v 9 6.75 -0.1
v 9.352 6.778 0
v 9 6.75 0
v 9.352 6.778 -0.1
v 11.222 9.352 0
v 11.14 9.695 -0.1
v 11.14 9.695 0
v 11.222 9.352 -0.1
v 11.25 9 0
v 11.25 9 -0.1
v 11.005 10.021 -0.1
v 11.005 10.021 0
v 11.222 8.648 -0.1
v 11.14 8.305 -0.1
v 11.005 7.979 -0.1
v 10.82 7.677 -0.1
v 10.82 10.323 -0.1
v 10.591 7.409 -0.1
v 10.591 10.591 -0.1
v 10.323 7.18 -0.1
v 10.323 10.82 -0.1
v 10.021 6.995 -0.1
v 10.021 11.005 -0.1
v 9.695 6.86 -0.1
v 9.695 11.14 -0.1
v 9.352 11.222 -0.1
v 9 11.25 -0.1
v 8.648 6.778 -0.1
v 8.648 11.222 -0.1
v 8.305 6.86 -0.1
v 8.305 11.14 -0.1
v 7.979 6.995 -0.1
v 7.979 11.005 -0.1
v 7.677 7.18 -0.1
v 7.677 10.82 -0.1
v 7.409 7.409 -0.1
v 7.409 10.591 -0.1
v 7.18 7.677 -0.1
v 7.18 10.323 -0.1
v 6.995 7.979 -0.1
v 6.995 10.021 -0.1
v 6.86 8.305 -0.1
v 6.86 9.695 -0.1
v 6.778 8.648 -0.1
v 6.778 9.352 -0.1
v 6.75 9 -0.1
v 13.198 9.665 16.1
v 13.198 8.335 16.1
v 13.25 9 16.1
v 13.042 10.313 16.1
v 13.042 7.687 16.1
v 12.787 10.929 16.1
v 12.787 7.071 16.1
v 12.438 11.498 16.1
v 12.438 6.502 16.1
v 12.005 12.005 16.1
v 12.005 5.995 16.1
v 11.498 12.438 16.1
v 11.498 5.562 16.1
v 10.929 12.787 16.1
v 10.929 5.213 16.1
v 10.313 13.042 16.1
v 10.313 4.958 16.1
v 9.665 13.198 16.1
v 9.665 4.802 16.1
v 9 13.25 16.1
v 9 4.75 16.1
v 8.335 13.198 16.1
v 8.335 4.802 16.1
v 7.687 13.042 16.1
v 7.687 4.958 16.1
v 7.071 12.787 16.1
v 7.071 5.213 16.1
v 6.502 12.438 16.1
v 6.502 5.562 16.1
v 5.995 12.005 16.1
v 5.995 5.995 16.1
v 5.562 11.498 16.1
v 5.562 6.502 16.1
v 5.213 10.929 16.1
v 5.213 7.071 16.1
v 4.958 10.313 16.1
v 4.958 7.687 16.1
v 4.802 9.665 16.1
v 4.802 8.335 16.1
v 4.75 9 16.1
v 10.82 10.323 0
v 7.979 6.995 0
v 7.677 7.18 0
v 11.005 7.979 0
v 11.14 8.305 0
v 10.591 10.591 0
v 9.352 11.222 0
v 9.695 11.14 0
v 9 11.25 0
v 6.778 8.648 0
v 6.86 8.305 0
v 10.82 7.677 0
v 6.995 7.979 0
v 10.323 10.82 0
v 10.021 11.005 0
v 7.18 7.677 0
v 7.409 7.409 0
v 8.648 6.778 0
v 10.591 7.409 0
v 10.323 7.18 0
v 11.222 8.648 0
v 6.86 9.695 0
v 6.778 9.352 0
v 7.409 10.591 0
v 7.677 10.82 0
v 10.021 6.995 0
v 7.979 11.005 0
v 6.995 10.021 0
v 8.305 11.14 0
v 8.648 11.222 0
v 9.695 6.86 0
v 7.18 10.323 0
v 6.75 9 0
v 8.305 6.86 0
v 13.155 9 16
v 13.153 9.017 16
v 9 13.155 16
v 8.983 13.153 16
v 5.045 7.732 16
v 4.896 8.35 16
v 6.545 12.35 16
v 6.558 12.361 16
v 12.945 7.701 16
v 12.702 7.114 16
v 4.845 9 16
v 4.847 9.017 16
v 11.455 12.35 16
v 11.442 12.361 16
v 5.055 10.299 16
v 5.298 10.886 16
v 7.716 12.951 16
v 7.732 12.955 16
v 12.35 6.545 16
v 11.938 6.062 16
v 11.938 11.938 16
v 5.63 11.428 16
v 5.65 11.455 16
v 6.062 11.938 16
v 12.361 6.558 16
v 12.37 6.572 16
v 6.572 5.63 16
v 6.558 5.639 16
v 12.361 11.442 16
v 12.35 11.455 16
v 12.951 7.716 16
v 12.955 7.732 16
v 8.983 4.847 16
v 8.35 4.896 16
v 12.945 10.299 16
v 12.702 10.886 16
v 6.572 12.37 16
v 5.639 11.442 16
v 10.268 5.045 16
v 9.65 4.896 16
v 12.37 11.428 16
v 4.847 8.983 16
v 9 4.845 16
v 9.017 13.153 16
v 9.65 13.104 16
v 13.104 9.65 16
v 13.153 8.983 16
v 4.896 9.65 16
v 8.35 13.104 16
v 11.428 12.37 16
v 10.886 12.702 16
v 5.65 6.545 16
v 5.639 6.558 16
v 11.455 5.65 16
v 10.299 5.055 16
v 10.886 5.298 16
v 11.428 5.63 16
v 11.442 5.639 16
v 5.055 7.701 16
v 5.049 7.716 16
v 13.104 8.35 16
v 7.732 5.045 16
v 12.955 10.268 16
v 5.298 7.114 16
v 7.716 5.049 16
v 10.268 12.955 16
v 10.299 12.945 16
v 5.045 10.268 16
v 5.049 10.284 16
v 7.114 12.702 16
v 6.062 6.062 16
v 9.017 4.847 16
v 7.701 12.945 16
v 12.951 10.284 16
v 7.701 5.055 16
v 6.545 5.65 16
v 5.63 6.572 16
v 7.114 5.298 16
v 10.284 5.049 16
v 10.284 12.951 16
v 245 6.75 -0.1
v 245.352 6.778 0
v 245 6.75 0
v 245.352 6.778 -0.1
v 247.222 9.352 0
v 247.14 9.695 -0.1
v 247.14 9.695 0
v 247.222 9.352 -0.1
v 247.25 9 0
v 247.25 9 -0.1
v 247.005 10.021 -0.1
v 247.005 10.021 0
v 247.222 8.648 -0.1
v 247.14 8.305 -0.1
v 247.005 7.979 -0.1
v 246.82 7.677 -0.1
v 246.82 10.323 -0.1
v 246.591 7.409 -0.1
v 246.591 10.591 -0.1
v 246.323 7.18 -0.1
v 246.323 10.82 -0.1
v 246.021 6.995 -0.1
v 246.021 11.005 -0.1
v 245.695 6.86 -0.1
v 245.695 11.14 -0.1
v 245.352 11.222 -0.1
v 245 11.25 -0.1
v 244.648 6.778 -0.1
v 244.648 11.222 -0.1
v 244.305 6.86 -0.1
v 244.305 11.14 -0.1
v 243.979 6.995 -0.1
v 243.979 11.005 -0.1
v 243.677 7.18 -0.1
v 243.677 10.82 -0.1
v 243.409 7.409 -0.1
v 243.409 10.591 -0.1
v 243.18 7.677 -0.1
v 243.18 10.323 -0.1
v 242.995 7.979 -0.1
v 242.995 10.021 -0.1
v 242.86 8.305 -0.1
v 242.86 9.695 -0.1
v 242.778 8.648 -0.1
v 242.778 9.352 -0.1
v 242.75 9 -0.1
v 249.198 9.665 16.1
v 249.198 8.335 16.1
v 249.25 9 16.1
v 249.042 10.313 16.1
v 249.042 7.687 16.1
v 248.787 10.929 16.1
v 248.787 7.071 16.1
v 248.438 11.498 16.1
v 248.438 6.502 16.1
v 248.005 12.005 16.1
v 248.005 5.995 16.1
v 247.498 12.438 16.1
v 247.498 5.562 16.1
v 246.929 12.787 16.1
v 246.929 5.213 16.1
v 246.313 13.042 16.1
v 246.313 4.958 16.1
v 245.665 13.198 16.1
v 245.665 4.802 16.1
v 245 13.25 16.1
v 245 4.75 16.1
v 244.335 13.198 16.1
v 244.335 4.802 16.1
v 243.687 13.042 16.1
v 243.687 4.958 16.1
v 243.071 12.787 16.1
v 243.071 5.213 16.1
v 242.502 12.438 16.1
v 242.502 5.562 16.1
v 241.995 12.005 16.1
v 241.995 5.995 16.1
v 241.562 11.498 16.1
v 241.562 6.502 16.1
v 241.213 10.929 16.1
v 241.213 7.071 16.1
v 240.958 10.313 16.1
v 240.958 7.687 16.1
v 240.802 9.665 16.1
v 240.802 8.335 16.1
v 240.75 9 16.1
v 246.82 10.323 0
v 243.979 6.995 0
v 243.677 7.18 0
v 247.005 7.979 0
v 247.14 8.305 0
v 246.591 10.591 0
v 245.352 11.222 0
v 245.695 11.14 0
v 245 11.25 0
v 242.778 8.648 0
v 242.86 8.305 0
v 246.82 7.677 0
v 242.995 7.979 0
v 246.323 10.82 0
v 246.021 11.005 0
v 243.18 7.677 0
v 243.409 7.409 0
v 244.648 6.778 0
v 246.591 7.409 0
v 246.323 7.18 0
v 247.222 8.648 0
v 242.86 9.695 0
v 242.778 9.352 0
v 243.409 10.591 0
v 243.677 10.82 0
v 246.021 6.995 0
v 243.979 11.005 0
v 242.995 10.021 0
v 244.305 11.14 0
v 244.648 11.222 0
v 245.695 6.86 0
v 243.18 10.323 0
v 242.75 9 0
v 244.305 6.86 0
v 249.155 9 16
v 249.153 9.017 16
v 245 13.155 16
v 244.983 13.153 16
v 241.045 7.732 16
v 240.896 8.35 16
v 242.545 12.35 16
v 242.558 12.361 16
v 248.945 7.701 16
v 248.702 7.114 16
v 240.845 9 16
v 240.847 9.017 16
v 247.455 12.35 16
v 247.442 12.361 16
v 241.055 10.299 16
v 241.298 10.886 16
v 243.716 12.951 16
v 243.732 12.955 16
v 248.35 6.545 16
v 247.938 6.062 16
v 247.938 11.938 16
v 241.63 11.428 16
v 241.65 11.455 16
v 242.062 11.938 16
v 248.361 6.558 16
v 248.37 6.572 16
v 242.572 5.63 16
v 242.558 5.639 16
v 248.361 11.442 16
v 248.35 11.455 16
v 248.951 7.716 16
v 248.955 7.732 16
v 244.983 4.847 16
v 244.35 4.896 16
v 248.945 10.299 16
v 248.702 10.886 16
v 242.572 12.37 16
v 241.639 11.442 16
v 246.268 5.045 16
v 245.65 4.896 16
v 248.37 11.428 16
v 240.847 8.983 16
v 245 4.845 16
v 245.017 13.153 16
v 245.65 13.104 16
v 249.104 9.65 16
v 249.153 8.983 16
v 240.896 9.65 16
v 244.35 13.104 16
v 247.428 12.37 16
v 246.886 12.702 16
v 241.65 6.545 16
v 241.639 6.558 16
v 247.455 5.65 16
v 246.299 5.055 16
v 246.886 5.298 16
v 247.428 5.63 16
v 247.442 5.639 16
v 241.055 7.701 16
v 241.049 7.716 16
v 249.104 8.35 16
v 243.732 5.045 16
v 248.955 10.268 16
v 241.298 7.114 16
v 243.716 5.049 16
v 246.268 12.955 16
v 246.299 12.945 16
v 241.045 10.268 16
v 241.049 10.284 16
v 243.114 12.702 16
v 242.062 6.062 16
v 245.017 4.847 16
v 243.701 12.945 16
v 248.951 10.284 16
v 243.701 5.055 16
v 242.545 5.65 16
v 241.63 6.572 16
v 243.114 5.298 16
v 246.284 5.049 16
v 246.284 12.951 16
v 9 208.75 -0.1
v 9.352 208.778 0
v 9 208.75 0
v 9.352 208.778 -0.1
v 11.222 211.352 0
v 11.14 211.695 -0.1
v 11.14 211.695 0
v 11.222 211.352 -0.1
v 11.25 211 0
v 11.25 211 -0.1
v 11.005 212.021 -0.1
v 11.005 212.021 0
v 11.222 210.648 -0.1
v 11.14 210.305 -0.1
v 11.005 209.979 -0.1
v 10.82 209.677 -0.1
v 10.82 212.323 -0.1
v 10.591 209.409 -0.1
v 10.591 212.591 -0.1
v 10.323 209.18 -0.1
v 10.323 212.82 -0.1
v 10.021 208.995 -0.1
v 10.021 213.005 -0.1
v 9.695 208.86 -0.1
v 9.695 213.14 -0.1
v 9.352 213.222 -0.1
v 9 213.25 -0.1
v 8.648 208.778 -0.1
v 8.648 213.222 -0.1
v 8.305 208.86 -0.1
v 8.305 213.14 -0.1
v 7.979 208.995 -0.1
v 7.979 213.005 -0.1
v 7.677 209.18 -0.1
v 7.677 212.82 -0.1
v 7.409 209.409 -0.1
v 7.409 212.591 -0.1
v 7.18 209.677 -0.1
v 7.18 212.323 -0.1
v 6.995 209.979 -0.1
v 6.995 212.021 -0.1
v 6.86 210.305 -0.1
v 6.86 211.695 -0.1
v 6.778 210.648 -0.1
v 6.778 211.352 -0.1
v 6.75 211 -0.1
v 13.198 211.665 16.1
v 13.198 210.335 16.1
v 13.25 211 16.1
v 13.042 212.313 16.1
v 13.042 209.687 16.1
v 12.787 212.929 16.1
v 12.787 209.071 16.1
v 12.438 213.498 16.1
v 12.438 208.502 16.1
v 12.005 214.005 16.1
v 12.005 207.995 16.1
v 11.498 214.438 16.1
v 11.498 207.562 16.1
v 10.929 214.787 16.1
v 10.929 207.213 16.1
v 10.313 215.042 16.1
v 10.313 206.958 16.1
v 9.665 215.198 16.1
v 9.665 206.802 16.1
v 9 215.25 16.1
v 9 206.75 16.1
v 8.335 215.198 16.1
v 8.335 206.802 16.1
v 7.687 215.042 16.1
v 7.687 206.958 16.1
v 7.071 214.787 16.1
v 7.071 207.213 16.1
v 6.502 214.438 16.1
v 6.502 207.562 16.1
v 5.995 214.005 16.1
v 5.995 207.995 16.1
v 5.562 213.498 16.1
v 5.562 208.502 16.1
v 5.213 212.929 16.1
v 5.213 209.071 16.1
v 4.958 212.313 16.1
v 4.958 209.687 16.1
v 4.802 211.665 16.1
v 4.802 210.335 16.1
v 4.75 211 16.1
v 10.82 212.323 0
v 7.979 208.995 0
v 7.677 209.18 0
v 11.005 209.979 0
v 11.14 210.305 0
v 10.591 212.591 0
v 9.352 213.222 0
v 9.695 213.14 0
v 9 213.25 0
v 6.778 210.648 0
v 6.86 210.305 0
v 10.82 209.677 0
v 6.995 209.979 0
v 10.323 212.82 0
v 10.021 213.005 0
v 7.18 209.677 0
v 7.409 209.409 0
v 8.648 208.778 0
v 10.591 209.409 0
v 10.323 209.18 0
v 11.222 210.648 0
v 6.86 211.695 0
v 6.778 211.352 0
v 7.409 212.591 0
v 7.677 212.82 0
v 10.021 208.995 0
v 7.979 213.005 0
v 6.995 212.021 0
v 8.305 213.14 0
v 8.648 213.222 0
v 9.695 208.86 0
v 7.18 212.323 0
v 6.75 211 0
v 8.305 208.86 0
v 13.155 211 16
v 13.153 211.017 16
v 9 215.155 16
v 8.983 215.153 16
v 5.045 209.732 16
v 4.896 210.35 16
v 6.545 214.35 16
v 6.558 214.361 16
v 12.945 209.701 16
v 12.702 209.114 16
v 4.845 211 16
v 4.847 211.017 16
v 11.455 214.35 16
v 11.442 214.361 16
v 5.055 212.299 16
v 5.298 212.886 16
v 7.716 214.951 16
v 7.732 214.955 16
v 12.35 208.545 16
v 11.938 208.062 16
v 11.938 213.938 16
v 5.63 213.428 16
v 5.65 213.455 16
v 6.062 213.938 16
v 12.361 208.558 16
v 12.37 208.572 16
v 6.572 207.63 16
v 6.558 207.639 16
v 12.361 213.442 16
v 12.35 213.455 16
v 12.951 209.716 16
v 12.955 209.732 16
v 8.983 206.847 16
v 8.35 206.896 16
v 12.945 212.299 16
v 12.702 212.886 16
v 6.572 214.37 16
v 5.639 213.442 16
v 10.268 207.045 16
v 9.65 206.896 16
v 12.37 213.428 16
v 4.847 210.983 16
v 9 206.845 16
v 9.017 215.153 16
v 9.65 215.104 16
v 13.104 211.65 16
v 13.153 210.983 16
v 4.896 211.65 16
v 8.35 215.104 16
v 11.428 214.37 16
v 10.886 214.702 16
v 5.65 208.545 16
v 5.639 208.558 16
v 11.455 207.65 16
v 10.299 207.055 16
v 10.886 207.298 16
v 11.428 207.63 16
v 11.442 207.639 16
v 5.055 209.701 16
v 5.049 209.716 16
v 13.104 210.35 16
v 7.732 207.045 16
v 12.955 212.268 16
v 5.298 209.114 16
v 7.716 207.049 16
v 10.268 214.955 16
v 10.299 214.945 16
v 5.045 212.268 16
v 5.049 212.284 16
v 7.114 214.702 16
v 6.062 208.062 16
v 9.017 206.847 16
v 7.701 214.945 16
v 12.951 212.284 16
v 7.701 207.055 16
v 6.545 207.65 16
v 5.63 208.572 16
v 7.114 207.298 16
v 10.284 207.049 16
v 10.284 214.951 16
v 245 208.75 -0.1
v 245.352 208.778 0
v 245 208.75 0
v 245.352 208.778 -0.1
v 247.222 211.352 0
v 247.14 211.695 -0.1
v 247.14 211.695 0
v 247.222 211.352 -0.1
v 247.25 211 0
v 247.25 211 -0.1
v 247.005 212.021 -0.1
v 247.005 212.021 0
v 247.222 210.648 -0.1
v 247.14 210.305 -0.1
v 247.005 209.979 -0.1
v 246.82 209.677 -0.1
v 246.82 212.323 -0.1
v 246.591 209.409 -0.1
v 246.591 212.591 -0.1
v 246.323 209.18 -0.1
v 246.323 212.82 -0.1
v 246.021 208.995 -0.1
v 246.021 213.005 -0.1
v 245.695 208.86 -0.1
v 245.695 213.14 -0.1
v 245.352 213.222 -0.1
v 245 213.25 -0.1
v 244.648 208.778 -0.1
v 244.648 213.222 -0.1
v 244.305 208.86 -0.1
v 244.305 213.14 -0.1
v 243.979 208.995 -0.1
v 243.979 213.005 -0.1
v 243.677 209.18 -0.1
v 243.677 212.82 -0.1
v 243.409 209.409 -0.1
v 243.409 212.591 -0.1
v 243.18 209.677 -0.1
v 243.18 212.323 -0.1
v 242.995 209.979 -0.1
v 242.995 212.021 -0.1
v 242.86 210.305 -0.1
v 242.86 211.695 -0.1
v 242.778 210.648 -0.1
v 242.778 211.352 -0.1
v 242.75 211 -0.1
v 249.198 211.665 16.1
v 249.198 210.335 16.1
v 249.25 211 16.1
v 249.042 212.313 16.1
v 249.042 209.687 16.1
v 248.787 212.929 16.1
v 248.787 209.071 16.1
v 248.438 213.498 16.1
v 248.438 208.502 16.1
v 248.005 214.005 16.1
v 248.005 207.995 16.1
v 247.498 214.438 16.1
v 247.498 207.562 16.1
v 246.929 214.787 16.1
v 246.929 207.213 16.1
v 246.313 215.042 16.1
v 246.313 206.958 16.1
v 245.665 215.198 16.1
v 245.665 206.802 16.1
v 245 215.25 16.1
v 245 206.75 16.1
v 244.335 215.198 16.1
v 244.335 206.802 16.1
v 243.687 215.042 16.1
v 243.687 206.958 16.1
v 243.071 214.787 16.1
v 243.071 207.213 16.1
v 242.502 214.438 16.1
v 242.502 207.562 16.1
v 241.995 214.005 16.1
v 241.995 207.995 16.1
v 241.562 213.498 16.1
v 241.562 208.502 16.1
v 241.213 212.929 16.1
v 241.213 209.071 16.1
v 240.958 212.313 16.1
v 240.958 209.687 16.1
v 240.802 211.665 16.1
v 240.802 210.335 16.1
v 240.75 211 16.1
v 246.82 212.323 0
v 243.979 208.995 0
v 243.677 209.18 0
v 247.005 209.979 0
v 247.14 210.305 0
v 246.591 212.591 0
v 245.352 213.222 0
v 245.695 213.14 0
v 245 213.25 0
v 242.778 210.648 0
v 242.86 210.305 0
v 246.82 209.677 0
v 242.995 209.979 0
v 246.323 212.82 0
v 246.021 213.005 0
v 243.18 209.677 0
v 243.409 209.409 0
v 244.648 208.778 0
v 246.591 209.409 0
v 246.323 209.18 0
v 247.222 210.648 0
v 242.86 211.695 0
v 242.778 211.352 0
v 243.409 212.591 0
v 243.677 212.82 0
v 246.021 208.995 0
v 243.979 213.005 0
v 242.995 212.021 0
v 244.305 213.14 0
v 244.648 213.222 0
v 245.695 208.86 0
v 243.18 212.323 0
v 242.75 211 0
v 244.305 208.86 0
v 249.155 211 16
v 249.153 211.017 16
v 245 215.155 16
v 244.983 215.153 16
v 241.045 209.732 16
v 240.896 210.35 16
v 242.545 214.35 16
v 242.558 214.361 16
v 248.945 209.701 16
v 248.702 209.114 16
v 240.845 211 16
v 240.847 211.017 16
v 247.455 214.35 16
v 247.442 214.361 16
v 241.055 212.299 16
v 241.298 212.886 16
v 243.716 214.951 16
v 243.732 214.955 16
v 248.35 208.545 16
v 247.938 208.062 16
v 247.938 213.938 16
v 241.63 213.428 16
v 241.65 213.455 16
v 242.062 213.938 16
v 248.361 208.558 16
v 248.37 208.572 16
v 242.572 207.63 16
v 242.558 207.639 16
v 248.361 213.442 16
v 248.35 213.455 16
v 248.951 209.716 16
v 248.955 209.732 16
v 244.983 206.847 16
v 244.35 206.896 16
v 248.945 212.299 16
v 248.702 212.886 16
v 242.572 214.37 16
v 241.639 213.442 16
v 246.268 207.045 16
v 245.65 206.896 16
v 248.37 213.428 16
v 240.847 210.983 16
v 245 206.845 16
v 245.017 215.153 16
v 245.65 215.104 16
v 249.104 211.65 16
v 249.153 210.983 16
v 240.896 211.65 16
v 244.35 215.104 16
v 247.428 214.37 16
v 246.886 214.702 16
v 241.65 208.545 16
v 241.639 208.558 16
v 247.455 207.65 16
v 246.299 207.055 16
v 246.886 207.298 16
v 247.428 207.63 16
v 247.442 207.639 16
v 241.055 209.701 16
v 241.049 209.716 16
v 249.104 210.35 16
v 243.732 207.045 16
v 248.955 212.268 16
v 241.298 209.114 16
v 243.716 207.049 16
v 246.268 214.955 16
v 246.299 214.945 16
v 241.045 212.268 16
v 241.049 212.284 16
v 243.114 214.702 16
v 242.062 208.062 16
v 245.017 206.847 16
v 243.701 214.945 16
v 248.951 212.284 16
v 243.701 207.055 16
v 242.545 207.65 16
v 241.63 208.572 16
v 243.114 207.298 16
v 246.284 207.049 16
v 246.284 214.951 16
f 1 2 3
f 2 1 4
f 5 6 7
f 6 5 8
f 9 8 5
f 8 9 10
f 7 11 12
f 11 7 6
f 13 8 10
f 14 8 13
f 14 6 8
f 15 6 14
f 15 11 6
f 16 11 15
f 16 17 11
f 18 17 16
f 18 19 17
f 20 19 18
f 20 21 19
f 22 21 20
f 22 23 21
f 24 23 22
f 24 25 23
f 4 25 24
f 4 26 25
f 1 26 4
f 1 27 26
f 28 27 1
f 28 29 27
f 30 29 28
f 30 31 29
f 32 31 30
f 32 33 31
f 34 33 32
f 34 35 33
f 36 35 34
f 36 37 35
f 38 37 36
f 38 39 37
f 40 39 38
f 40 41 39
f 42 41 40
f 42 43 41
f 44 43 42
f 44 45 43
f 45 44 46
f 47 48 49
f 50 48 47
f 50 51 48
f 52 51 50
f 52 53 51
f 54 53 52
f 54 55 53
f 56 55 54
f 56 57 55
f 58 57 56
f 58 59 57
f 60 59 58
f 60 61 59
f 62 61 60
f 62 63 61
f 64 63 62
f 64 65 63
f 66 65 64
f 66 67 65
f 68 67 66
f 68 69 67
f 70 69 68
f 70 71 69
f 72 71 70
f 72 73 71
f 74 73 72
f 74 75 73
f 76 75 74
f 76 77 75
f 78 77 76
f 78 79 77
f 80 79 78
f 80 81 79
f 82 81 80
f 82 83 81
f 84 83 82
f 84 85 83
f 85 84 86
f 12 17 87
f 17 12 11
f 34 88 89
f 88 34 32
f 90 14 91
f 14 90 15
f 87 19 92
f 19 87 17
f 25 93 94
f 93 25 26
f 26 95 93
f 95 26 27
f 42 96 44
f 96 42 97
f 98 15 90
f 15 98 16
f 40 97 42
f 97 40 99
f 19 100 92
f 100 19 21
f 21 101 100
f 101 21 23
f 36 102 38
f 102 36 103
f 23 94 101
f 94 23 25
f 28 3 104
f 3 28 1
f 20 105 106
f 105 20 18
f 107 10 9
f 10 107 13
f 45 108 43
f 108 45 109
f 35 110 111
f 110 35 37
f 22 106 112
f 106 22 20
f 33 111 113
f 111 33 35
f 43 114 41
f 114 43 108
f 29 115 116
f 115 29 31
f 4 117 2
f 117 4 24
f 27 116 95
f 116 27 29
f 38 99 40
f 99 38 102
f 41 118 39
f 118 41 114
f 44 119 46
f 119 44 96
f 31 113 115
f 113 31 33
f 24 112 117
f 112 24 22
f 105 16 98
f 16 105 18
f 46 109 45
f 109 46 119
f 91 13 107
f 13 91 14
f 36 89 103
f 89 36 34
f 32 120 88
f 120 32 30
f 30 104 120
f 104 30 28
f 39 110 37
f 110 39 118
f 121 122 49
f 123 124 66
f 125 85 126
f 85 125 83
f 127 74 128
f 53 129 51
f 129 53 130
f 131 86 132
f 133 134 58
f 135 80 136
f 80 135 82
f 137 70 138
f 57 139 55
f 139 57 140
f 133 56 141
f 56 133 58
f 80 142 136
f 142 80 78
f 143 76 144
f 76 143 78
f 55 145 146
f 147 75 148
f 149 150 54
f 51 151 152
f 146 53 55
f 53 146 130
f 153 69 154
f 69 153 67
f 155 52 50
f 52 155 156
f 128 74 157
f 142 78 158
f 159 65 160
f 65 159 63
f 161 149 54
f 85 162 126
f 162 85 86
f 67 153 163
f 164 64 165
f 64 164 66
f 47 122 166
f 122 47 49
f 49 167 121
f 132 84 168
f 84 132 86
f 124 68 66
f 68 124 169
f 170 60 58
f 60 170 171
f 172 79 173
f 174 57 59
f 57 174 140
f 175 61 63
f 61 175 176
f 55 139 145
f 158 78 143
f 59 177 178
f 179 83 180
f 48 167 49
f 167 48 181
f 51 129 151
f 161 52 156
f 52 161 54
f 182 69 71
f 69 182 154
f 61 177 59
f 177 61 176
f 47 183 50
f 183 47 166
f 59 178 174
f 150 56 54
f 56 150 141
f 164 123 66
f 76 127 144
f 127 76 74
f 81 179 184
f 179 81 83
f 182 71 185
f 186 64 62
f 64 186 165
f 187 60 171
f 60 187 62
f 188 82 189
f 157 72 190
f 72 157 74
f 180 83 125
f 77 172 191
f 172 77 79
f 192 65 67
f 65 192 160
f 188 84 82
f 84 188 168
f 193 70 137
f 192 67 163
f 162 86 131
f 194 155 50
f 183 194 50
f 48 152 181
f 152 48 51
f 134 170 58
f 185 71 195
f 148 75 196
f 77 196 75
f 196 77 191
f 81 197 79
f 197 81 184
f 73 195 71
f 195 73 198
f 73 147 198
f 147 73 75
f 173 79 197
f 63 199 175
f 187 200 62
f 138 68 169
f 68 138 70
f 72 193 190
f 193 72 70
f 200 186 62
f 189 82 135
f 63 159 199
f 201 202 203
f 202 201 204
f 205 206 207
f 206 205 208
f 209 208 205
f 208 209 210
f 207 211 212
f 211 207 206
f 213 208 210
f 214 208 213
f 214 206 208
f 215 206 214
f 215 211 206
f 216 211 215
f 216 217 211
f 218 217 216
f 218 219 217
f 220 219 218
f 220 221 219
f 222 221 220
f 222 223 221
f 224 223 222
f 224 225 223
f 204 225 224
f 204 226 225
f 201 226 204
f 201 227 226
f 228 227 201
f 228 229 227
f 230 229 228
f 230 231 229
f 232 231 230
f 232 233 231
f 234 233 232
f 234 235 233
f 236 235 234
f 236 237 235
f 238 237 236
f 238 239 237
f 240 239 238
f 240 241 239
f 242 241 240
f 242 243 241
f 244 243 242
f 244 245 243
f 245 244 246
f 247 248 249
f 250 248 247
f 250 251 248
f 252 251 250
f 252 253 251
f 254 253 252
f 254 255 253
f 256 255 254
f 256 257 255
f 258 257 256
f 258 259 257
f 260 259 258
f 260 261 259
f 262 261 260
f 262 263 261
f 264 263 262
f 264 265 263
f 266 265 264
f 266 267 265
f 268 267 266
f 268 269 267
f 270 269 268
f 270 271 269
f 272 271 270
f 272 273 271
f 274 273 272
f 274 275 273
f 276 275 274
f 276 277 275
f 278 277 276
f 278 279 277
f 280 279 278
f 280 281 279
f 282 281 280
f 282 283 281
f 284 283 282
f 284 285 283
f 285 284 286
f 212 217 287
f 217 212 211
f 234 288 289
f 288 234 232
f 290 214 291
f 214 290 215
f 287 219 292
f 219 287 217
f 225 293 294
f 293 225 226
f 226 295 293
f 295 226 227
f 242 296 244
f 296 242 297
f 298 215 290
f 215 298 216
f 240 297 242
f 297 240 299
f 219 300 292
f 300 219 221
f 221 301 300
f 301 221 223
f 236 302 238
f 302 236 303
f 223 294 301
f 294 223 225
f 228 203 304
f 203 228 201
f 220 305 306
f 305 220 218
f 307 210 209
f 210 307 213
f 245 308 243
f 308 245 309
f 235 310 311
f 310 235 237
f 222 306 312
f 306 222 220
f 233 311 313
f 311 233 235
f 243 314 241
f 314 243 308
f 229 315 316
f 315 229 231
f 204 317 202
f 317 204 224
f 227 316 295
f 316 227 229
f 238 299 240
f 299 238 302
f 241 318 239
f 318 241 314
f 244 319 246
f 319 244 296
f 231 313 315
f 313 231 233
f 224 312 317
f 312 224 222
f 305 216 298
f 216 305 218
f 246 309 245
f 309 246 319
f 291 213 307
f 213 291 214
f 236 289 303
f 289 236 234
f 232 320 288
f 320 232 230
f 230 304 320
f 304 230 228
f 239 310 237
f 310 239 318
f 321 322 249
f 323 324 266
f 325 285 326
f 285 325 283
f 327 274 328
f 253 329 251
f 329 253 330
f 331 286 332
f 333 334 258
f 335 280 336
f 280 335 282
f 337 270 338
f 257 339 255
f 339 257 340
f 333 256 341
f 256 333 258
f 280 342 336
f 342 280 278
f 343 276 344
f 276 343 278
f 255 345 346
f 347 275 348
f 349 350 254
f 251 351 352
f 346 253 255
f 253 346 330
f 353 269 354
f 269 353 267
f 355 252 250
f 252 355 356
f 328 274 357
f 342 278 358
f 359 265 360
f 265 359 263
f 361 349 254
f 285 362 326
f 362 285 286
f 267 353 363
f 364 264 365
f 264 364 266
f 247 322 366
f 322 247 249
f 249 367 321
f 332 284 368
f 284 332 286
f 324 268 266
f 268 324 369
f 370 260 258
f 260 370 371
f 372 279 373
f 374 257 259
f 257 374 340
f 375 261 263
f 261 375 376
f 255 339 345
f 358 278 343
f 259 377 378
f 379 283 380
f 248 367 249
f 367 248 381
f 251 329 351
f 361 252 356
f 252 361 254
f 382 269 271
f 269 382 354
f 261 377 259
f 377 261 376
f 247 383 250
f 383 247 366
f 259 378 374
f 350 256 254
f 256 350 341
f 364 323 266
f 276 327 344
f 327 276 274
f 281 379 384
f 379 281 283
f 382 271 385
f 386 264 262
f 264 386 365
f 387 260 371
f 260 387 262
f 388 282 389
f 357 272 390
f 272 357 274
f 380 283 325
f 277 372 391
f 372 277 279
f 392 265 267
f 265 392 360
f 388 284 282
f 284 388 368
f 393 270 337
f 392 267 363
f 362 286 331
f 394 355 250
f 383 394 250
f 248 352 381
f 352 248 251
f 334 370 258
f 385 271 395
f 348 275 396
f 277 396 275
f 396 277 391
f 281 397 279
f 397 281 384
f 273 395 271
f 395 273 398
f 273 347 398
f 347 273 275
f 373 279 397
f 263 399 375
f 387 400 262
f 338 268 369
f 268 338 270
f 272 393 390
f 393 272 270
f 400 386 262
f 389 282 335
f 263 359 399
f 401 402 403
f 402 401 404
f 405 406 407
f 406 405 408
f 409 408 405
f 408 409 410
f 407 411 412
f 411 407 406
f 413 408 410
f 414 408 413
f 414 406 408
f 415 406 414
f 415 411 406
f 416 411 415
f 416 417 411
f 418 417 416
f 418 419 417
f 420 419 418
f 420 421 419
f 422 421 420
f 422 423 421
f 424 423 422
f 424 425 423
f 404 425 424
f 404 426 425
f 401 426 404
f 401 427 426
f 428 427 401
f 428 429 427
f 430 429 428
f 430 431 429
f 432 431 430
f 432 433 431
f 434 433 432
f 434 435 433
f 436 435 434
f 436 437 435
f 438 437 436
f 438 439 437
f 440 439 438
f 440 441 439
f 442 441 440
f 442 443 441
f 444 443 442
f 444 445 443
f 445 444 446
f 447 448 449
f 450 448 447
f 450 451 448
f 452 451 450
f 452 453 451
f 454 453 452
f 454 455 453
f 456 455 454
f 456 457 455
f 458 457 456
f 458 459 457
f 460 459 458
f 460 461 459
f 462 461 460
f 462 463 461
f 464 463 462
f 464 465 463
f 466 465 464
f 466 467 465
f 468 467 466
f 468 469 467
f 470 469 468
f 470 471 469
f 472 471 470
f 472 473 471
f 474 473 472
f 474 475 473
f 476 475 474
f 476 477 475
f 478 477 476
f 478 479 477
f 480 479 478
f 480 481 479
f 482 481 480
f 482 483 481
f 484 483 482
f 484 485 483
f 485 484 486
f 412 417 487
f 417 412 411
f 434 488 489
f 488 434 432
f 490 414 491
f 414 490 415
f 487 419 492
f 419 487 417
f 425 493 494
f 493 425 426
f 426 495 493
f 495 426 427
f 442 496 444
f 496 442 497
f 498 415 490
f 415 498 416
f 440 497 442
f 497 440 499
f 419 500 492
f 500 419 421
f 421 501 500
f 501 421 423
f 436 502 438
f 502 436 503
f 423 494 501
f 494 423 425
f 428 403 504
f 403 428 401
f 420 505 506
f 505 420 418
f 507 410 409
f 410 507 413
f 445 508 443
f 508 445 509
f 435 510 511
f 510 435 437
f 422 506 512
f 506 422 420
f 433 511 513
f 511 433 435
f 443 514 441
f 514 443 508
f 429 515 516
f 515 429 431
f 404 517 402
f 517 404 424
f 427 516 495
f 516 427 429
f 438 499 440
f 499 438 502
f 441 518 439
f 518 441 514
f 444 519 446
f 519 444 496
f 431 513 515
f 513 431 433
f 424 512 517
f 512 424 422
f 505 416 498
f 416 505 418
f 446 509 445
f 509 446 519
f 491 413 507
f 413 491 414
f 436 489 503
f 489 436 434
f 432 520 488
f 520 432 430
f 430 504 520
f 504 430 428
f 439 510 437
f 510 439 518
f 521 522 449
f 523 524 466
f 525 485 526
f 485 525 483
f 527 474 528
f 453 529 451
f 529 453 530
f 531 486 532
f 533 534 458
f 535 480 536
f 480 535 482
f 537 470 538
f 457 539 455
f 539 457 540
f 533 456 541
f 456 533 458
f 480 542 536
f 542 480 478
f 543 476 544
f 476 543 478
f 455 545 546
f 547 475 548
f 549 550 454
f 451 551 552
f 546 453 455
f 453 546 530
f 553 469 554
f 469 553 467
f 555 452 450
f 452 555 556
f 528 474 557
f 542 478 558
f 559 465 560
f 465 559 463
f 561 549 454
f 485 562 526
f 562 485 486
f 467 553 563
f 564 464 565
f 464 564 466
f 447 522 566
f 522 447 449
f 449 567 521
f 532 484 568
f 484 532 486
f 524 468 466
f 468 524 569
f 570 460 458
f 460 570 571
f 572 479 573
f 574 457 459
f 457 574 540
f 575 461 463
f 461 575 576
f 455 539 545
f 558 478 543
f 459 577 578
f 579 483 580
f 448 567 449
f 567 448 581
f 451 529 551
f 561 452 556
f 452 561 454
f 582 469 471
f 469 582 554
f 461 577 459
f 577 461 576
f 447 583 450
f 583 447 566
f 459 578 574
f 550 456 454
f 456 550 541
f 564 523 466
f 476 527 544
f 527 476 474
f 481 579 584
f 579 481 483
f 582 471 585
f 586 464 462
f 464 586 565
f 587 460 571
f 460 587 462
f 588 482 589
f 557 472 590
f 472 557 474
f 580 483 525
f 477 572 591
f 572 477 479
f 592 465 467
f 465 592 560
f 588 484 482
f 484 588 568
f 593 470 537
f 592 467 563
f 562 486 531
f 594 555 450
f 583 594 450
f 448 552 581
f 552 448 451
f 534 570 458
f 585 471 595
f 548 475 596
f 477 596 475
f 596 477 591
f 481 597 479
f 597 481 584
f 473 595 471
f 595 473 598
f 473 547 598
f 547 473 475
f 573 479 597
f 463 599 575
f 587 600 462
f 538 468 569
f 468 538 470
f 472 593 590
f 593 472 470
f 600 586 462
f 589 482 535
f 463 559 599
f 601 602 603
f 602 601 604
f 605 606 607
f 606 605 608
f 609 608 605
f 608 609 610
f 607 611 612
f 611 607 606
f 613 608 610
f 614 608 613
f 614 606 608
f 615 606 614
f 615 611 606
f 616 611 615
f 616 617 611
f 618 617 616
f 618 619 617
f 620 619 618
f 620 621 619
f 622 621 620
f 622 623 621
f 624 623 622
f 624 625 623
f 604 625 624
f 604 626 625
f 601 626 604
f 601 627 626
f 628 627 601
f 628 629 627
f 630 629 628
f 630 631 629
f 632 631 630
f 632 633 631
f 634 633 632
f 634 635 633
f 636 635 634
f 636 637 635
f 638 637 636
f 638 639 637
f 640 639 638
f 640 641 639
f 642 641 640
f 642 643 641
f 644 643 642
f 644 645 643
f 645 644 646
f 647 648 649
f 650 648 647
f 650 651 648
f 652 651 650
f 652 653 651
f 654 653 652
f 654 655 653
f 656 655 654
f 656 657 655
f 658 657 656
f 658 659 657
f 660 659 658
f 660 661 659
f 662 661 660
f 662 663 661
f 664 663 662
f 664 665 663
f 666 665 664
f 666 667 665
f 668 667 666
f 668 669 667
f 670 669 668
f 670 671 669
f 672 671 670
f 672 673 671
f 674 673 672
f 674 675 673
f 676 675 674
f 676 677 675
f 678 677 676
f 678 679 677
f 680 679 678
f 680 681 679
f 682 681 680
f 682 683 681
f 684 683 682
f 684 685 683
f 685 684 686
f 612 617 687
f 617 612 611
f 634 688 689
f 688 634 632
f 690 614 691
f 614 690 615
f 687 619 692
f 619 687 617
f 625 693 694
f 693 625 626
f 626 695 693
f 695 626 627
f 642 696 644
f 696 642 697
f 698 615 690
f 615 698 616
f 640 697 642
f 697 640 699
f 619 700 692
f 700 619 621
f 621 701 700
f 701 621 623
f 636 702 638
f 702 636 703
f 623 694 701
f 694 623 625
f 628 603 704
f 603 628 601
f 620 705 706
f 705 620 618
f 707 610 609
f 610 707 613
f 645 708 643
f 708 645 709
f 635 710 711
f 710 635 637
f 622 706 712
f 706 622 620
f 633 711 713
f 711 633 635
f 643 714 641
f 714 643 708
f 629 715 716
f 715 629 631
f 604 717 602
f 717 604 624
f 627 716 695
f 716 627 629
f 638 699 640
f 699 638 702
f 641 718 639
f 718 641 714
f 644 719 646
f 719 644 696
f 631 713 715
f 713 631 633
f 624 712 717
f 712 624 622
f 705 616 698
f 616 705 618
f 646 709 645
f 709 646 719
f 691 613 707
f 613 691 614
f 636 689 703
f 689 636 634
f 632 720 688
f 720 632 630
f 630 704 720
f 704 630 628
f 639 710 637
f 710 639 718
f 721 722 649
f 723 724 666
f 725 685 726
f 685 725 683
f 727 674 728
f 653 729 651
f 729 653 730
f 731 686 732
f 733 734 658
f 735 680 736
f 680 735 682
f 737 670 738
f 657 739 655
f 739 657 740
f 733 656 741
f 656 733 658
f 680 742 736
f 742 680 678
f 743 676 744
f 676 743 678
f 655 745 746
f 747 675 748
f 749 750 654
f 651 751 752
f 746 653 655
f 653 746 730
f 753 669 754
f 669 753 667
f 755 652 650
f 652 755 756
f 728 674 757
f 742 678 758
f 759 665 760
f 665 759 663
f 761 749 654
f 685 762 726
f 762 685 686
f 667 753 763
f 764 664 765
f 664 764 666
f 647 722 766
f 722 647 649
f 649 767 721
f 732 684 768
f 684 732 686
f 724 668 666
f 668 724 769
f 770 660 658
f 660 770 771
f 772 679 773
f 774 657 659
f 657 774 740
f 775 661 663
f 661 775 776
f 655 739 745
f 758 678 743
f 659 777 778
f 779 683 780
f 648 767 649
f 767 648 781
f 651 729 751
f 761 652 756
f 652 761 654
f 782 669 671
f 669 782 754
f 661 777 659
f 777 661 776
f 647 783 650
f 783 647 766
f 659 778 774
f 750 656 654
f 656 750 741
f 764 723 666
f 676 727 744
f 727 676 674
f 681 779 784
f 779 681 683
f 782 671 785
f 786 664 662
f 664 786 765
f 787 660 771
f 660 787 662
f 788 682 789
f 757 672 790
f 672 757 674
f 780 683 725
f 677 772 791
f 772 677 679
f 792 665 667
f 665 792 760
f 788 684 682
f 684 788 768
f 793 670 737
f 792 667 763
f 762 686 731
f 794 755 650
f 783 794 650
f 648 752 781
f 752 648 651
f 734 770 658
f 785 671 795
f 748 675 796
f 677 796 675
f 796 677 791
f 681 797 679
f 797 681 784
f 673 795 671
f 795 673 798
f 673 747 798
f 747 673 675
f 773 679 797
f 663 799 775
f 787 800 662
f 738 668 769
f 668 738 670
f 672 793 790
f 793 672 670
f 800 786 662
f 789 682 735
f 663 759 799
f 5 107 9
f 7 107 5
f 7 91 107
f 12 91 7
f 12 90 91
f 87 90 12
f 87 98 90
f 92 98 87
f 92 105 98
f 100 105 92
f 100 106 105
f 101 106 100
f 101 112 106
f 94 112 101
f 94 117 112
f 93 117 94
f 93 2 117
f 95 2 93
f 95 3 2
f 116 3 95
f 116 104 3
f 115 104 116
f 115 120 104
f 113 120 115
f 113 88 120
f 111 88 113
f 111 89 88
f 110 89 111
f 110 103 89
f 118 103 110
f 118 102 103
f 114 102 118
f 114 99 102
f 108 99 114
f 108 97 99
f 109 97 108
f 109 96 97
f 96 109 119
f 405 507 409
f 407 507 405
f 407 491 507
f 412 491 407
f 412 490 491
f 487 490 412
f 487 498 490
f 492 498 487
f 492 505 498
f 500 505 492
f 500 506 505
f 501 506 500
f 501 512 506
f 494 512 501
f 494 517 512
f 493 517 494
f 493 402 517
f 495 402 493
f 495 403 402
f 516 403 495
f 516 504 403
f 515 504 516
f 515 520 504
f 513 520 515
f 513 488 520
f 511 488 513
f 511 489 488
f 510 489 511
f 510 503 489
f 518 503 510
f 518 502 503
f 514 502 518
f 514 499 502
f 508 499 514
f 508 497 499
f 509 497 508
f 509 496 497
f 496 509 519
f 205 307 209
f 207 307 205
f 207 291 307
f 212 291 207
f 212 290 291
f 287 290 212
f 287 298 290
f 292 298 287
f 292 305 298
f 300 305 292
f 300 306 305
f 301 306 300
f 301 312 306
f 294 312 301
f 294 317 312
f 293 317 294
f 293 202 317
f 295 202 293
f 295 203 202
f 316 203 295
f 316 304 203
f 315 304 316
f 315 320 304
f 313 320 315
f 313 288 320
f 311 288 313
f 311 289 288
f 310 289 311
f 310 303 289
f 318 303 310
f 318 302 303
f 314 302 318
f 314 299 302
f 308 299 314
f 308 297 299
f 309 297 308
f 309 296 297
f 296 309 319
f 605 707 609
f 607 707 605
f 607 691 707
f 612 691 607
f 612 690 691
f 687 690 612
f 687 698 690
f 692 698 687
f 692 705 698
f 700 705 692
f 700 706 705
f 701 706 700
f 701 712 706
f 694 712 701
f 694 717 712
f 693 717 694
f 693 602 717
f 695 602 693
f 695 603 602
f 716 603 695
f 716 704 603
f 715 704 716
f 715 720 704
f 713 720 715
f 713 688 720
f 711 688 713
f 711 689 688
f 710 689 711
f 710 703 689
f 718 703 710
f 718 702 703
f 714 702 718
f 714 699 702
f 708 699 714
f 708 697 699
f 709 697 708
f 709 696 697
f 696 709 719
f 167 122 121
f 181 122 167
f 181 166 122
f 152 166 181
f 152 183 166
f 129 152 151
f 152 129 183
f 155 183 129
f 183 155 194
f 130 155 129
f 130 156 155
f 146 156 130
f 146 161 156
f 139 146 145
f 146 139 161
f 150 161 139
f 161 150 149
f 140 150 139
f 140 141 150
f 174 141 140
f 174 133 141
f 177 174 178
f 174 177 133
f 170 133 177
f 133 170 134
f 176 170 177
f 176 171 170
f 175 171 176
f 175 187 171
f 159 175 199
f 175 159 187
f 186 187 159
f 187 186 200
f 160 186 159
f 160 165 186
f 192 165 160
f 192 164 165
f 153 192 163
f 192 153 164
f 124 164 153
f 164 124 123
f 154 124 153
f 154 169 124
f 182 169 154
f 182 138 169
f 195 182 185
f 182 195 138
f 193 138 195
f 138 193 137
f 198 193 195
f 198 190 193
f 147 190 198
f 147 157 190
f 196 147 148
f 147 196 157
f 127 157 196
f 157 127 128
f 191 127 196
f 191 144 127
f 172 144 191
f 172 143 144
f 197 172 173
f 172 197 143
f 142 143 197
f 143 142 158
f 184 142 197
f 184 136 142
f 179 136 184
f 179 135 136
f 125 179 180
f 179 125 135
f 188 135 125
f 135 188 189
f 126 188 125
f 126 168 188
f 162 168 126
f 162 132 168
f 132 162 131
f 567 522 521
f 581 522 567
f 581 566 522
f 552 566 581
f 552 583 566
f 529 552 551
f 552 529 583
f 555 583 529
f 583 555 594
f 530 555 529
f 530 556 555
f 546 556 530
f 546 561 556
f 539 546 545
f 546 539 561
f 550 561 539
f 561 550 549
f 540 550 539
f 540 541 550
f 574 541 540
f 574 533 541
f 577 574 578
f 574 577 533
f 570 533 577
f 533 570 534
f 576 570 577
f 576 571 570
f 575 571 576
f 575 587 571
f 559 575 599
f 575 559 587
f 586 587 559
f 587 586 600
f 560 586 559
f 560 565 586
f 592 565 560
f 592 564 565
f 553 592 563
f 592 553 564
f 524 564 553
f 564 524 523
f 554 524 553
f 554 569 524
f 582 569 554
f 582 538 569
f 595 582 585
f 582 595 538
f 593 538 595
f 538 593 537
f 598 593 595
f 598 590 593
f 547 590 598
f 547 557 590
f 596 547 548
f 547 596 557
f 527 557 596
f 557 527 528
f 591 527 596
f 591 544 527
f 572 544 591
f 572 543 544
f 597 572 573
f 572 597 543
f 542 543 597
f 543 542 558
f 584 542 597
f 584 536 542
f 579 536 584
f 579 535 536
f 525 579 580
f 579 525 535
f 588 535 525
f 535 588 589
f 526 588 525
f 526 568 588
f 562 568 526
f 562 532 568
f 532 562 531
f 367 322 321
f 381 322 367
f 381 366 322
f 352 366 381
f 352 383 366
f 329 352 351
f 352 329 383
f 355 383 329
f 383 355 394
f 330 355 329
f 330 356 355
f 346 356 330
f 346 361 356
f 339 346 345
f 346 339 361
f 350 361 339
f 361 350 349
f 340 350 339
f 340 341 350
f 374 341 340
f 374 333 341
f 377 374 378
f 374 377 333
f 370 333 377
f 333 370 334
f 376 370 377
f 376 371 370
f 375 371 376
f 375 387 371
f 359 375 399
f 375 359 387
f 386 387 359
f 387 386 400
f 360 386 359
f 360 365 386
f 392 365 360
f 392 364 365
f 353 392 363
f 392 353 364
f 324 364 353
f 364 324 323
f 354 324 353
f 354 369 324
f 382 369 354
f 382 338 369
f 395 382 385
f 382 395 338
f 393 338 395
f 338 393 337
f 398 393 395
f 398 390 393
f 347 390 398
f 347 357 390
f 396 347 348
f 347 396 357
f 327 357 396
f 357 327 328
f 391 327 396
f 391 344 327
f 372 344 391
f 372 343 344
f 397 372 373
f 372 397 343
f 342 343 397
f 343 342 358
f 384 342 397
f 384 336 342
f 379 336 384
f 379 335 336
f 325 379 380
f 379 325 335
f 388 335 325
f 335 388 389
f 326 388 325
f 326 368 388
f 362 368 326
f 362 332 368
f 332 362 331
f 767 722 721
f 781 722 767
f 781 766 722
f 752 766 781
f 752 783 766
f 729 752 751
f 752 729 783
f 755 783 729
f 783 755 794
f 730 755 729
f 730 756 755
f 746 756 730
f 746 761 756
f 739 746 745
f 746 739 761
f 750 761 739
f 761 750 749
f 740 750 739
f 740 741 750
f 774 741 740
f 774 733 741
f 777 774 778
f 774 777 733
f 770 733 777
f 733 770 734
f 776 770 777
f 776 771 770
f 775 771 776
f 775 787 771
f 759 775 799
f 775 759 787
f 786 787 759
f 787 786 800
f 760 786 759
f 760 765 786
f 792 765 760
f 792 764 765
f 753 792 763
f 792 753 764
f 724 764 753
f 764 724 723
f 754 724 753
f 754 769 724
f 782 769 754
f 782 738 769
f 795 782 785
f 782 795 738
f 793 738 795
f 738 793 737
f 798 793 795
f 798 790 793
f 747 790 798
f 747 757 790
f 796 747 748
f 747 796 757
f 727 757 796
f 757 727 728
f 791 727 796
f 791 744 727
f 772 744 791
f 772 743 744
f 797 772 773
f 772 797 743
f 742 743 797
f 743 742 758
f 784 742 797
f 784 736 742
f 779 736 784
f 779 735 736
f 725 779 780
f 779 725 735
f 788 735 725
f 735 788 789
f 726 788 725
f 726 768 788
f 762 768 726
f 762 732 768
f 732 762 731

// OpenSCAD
// Controlli geometrici dei fori. Ogni test deve dare un oggetto VUOTO.
//  test = "ring_top_out"    : svasature cornice sopra che escono dal pezzo
//  test = "ring_bottom_out" : svasature cornice sotto che escono dal pezzo
//  test = "post_clash"      : fori pilota montante che toccano altri fori
//  test = "align"           : viti cornice NON allineate ai fori pilota dei montanti
include <rack10.scad>
part = "none";
test = "ring_top_out";

module ring_envelope() {   // sagoma piena della cornice (senza apertura centrale)
  hull() {
    linear_extrude(ring_h - 3) rrect(PW, D, ring_r);
    translate([0, 0, ring_h - 3]) linear_extrude(3) offset(delta = -2.5) rrect(PW, D, ring_r);
  }
}
module ring_top_holes() { for (p = ring_screws) translate([p[0], p[1], 0]) cs_hole(st4_clear, st4_head, ring_h); }
module ring_bottom_holes() { for (p = ring_screws) translate([p[0], p[1], ring_h]) mirror([0, 0, 1]) cs_hole(st4_clear, st4_head, ring_h); }
module top_material() { union() { ring_body(); translate([post, post, ring_h - 3]) cube([PW - 2 * post, D - 2 * post, 3]); } }
module bottom_material() { union() { ring_body(); translate([post, post, 0]) cube([PW - 2 * post, D - 2 * post, 3]); } }

module post_other_holes(nu, base) {
  for (z = m6_z(nu, base)) translate([EAR, 0, z]) {
    translate([0, -1, 0]) rotate([-90, 0, 0]) cylinder(d = screw_d, h = post + 2);
    translate([0, post - nut_h, 0]) rotate([-90, 0, 0]) rotate([0, 0, 30]) cylinder(d = nut_d, h = nut_h + 1, $fn = 6);
  }
  for (z = side_z(nu, base), x = [-0.1, post - 7]) translate([x, 5, z]) rotate([0, 90, 0]) cylinder(d = st3_pilot, h = 7.1);
  for (p = pins) translate([p[0], p[1], -0.1]) cylinder(d = 4.4, h = 6.6);
}
module post_pilots(L) {
  for (p = screw_pl) { translate([p[0], p[1], -0.1]) cylinder(d = st4_pilot, h = pilot_len); translate([p[0], p[1], L - pilot_len]) cylinder(d = st4_pilot, h = pilot_len + 0.1); }
}

// interseca le colonne delle viti cornice con i montanti "pieni" meno i fori pilota: se resta qualcosa, non sono allineate
module align_test() {
  intersection() {
    for (p = ring_screws) translate([p[0], p[1], -1]) cylinder(d = st4_pilot - 0.2, h = 3);
    difference() {
      post_corners() translate([0, 0, -5]) cube([post, post, 10]);
      post_corners() for (p = screw_pl) translate([p[0], p[1], -6]) cylinder(d = st4_pilot, h = 12);
    }
  }
}

if (test == "ring_top_out") difference() { ring_top_holes(); top_material(); translate([post, post, -1]) cube([PW - 2 * post, D - 2 * post, ring_h - 3 + 1]); }
else if (test == "ring_bottom_out") difference() { ring_bottom_holes(); bottom_material(); translate([post, post, 3]) cube([PW - 2 * post, D - 2 * post, ring_h]); }
else if (test == "post_clash") {
  intersection() { post_pilots(base_h + 2 * U); post_other_holes(2, base_h); }
  translate([40, 0, 0]) intersection() { post_pilots(2 * U); post_other_holes(2, 0); }
}
else if (test == "align") align_test();
